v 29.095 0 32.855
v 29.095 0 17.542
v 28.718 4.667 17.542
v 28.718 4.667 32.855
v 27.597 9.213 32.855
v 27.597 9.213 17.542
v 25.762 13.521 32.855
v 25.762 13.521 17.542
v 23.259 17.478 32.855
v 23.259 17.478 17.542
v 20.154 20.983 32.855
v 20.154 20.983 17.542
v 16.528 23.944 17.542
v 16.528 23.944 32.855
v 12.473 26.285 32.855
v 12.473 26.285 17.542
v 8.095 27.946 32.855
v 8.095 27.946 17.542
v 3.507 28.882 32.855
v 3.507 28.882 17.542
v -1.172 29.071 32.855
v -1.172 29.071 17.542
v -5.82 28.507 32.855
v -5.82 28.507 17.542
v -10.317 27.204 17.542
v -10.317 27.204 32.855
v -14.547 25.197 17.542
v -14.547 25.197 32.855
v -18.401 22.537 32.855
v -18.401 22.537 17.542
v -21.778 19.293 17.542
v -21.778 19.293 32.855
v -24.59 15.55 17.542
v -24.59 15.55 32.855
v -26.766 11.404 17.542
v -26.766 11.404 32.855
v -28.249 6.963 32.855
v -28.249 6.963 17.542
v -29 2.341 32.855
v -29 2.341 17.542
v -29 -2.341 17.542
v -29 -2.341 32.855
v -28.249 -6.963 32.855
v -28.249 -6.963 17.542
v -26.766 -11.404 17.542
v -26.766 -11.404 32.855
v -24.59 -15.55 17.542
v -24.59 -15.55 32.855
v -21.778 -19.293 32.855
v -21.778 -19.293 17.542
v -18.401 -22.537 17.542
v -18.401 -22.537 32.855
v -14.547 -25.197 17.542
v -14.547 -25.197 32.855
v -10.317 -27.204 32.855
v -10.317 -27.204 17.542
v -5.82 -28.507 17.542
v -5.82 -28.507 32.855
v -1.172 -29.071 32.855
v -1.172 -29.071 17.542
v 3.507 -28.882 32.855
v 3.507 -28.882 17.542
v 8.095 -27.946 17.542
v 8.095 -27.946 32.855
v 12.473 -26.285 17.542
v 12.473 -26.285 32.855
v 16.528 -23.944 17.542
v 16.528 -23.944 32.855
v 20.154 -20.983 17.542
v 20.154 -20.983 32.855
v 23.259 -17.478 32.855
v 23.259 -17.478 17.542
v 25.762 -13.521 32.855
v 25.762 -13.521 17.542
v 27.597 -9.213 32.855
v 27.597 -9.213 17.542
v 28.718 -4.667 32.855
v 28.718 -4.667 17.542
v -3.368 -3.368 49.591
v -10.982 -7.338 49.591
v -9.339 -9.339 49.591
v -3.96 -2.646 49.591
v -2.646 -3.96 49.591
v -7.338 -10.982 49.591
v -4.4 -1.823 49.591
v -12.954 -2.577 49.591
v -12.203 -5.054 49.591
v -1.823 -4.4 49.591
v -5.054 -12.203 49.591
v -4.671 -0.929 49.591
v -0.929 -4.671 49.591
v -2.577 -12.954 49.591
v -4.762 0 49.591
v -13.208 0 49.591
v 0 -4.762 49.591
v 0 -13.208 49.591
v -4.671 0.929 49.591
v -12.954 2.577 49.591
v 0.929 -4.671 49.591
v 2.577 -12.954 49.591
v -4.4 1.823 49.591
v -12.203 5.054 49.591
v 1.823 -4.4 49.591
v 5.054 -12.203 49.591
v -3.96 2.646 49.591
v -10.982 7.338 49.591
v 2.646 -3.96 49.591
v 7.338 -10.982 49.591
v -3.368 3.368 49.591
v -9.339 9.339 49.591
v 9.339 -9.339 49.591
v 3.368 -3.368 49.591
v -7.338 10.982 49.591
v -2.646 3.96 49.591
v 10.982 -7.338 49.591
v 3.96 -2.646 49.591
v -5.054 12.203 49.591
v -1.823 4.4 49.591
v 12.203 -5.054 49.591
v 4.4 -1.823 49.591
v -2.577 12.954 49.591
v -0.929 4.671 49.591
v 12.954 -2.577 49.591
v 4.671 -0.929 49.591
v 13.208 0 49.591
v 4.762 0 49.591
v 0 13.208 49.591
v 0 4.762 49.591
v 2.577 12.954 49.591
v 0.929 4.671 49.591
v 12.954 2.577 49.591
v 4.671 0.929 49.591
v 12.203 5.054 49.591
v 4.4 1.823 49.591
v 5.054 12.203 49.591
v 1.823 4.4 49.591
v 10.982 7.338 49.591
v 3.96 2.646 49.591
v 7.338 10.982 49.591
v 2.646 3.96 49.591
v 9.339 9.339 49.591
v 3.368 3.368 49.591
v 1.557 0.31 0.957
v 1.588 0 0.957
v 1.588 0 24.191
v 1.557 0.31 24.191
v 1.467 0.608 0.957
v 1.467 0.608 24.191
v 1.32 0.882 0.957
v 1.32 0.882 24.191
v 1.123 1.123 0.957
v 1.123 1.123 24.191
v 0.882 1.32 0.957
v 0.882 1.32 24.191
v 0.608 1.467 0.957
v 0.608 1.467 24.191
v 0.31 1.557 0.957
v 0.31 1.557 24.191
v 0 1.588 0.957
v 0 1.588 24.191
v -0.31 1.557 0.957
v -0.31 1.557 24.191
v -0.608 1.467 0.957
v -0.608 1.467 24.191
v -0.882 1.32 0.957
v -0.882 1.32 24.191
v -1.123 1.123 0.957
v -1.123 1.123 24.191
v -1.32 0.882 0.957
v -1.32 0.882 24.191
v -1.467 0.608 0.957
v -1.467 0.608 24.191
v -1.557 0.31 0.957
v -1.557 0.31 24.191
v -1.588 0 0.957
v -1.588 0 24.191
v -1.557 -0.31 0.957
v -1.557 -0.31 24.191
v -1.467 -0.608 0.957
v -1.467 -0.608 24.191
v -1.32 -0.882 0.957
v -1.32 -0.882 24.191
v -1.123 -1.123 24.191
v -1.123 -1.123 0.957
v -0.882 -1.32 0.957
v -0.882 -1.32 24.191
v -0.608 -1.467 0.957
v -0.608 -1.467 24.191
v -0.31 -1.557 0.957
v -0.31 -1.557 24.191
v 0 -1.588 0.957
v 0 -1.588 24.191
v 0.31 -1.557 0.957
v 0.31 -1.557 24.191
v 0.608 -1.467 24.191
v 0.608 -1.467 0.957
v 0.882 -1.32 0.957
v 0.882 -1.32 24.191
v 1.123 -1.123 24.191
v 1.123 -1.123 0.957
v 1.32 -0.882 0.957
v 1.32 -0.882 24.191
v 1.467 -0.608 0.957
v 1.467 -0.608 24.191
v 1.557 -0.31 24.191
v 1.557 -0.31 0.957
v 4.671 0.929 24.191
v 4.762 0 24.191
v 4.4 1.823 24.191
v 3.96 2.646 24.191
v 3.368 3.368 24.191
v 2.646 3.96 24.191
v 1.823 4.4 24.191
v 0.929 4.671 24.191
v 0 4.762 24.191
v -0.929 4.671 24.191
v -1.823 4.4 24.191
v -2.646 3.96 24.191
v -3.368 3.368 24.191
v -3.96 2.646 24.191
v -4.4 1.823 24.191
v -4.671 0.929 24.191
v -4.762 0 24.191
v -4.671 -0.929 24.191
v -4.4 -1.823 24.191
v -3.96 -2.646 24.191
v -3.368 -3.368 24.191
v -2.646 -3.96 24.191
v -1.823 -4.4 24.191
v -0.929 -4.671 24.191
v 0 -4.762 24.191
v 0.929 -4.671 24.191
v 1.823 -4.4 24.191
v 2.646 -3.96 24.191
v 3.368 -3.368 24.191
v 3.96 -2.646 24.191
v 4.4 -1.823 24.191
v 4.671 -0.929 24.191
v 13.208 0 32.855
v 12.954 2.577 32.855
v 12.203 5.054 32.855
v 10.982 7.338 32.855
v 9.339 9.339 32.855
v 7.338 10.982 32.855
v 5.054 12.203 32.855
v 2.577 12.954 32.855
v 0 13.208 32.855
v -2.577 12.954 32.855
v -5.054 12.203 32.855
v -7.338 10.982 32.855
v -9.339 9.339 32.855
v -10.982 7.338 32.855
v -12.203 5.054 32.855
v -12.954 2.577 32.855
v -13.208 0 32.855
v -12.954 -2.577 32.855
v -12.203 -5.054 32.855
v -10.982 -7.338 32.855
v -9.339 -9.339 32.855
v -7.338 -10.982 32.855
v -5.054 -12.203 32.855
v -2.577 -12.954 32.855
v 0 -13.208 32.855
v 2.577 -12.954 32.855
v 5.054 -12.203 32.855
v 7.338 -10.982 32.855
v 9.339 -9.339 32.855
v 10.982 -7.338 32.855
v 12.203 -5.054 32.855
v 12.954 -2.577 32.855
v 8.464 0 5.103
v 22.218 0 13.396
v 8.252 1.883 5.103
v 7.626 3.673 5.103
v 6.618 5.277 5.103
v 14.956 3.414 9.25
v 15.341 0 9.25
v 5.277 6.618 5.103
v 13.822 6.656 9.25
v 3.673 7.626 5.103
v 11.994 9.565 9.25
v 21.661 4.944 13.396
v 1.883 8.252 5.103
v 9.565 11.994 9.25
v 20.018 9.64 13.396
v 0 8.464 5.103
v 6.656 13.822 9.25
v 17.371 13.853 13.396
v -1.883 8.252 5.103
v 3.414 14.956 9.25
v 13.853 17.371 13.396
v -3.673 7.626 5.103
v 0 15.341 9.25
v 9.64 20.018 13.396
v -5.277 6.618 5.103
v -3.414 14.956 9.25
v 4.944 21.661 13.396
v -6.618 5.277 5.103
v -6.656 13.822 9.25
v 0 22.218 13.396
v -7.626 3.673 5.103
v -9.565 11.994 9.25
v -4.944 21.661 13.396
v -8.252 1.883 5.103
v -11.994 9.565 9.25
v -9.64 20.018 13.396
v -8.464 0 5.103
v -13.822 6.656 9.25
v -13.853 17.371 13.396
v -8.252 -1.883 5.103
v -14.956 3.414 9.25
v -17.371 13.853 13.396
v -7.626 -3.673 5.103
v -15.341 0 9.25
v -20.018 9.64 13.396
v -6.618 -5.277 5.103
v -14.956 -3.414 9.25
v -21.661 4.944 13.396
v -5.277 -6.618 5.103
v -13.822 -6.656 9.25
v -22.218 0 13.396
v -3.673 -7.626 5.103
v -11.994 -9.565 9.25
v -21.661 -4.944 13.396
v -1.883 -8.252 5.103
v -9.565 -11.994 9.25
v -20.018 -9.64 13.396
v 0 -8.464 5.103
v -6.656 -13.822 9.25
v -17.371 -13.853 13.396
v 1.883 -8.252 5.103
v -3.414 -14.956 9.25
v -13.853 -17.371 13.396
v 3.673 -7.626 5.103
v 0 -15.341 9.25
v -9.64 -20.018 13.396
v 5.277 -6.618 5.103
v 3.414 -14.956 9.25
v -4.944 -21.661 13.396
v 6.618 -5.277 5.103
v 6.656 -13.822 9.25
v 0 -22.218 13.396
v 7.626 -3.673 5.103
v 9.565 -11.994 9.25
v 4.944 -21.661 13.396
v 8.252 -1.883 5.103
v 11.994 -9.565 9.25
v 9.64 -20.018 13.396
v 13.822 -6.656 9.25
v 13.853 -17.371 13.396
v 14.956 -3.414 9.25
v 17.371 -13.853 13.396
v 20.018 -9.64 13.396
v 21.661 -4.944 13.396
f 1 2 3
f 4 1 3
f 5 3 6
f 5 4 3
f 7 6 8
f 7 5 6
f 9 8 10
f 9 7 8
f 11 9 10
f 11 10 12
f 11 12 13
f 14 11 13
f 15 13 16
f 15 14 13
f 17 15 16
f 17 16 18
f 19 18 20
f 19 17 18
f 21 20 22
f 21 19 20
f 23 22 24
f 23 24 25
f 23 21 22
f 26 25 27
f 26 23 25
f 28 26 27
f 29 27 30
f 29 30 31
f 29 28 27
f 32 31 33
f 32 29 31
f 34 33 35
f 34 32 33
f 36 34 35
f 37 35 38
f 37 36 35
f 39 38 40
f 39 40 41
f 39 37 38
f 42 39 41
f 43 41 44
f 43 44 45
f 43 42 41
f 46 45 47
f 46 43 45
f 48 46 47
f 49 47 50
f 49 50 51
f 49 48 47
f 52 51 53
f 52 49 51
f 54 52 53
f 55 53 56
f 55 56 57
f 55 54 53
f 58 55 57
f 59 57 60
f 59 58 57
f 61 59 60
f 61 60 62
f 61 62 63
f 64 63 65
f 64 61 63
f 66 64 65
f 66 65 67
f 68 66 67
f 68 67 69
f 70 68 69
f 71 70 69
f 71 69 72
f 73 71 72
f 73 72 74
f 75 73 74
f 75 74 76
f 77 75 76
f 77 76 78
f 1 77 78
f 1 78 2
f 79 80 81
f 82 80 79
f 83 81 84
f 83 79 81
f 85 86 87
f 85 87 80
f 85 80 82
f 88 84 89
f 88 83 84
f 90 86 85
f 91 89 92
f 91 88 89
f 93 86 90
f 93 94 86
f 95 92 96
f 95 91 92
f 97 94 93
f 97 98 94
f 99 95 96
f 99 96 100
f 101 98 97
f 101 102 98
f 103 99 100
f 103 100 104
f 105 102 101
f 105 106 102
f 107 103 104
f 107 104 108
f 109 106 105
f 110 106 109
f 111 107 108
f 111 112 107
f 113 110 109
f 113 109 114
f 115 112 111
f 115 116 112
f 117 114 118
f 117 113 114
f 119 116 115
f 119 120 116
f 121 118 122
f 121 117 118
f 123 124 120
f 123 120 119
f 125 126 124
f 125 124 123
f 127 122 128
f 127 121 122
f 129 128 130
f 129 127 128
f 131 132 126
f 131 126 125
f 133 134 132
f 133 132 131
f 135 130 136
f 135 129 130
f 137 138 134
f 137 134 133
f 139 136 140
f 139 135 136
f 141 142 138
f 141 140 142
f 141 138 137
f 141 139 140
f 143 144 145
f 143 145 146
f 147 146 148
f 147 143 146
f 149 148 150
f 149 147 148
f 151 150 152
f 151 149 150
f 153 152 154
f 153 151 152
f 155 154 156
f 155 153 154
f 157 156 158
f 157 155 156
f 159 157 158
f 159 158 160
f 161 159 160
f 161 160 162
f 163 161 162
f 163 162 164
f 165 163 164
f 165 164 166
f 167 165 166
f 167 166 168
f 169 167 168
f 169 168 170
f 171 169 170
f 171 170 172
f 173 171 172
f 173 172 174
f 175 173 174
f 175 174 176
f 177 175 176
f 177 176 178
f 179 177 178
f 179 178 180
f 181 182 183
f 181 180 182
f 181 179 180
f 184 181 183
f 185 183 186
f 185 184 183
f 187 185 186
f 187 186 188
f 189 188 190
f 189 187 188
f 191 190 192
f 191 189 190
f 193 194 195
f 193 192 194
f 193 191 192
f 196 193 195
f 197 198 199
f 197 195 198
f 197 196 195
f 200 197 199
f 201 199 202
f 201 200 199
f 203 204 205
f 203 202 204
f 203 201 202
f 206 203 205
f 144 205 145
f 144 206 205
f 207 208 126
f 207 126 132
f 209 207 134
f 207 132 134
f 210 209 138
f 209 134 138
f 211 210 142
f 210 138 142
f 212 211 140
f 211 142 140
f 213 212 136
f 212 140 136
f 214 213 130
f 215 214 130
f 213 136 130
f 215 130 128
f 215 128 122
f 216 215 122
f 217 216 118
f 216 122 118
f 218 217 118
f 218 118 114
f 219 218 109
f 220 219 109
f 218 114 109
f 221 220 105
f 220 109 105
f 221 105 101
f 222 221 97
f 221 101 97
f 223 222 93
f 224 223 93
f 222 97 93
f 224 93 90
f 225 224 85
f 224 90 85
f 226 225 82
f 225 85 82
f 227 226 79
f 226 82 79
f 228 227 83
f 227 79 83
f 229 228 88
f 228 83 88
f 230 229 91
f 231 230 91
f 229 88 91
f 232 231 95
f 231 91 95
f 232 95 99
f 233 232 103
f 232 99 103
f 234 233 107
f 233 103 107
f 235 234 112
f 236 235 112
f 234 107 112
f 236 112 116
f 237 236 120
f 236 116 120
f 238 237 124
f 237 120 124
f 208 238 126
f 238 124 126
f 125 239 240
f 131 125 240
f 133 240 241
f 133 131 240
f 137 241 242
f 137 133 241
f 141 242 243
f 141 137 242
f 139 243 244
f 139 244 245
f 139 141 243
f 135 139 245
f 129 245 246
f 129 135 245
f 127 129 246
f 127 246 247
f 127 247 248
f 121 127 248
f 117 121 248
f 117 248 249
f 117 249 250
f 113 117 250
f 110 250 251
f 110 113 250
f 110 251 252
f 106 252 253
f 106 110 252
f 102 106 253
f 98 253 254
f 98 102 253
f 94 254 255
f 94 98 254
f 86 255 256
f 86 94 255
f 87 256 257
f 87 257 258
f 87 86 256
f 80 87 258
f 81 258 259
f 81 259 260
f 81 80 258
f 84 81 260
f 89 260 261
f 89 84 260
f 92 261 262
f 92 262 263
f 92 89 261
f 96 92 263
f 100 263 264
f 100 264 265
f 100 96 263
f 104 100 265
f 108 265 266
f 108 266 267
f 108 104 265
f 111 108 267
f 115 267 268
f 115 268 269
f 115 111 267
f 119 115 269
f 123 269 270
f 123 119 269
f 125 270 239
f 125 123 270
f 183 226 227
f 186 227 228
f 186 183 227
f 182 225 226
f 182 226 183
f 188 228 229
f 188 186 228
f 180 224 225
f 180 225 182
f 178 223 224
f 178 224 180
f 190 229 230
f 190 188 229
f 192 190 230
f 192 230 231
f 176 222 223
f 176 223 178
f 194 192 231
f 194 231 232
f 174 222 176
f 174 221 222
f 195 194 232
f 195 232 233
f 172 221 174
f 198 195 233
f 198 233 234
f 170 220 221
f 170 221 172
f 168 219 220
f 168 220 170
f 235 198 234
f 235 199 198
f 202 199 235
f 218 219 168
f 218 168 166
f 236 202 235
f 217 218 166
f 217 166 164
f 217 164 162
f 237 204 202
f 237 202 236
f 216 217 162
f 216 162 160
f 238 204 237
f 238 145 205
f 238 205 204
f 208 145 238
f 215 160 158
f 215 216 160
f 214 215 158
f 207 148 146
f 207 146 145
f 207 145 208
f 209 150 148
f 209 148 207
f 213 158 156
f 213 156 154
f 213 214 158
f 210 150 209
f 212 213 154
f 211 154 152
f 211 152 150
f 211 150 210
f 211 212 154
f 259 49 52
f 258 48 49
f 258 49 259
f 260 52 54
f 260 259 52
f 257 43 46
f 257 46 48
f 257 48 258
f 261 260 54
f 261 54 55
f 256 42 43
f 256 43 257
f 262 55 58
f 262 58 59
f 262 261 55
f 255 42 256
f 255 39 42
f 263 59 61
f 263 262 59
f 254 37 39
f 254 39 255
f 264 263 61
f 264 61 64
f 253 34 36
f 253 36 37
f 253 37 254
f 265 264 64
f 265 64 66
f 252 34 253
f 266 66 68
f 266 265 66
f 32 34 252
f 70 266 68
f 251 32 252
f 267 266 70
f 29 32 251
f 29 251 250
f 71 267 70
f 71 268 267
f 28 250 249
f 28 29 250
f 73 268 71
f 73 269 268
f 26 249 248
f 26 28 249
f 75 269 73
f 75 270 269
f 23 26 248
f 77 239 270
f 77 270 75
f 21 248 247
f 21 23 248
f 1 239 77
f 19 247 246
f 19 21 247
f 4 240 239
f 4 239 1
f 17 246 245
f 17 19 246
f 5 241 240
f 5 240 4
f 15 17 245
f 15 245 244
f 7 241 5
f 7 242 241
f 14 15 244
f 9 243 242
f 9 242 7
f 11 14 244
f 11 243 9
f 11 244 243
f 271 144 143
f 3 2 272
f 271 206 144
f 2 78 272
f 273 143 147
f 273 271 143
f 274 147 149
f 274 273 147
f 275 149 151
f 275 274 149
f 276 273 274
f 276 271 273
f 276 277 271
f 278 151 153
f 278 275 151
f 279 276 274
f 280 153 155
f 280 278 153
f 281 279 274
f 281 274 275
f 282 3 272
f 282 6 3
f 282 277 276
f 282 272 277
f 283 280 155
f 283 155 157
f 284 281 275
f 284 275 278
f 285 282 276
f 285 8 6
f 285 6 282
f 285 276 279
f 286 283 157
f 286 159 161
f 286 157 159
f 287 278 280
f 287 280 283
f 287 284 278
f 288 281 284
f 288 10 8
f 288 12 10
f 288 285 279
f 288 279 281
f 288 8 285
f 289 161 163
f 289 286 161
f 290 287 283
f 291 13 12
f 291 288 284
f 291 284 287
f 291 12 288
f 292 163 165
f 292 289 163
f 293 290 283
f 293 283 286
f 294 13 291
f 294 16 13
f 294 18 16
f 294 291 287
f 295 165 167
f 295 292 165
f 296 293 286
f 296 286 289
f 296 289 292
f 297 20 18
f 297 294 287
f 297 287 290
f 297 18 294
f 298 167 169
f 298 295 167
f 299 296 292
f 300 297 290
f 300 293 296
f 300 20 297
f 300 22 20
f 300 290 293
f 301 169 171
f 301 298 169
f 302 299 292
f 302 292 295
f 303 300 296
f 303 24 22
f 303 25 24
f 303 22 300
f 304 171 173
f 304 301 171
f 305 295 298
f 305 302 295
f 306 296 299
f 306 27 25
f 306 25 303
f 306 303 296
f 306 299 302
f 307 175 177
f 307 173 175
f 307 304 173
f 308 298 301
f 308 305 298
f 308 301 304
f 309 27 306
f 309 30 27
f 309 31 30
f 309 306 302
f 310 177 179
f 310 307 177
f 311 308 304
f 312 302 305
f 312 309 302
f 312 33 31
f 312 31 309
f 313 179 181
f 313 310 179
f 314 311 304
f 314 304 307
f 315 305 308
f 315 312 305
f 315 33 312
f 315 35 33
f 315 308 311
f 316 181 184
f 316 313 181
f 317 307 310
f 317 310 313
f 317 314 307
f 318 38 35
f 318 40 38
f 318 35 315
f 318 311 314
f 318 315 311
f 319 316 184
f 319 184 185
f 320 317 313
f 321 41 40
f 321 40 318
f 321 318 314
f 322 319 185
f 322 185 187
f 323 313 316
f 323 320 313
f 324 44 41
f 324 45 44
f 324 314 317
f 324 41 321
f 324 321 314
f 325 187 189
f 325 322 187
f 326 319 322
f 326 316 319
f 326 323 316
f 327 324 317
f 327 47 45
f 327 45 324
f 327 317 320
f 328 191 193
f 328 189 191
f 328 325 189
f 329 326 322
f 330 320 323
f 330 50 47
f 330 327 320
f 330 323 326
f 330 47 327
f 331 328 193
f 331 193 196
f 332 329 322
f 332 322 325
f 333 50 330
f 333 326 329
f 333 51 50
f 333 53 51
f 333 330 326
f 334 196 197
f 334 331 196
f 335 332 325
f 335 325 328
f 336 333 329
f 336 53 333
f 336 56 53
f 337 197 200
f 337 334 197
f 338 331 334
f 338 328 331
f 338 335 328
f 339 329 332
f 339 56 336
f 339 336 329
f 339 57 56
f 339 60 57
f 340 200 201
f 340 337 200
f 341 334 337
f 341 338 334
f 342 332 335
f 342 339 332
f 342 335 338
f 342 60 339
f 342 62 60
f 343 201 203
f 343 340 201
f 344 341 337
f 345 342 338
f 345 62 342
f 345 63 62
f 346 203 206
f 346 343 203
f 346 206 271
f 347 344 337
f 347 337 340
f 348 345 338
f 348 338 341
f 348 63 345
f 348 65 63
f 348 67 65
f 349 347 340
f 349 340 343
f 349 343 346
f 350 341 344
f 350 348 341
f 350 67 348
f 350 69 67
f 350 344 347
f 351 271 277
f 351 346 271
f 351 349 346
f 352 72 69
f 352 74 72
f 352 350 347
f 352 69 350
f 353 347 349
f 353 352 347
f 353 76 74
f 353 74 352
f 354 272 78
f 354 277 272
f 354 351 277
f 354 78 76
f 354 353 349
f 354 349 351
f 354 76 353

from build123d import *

# Parameters (mm, degrees)
F2_R     = 4.7625
F4_DEPTH = 25.4
F5_R     = 1.5875
F6_DEPTH = 25.4


with BuildPart() as f1:
    # F0 (on Front) → F1 (revolve)
    with BuildSketch(Plane.XZ):
        Polygon((0, 49.591192), (0, 0), (29.094543, 17.542299), (29.094543, 32.854902), (13.208, 32.854902), (13.208, 49.591192), align=None)
    revolve(axis=Axis((0, 0, 24.795596), (0, 0, 1)))

    # F2 (on face) → F4 (cut)
    with BuildSketch(Plane.XY.offset(49.591192)):
        Circle(F2_R)
    extrude(amount=-F4_DEPTH, mode=Mode.SUBTRACT)

    # F5 (on Top) → F6 (cut)
    with BuildSketch(Plane.XY):
        Circle(F5_R)
    extrude(amount=F6_DEPTH, mode=Mode.SUBTRACT)


solid = f1.part
